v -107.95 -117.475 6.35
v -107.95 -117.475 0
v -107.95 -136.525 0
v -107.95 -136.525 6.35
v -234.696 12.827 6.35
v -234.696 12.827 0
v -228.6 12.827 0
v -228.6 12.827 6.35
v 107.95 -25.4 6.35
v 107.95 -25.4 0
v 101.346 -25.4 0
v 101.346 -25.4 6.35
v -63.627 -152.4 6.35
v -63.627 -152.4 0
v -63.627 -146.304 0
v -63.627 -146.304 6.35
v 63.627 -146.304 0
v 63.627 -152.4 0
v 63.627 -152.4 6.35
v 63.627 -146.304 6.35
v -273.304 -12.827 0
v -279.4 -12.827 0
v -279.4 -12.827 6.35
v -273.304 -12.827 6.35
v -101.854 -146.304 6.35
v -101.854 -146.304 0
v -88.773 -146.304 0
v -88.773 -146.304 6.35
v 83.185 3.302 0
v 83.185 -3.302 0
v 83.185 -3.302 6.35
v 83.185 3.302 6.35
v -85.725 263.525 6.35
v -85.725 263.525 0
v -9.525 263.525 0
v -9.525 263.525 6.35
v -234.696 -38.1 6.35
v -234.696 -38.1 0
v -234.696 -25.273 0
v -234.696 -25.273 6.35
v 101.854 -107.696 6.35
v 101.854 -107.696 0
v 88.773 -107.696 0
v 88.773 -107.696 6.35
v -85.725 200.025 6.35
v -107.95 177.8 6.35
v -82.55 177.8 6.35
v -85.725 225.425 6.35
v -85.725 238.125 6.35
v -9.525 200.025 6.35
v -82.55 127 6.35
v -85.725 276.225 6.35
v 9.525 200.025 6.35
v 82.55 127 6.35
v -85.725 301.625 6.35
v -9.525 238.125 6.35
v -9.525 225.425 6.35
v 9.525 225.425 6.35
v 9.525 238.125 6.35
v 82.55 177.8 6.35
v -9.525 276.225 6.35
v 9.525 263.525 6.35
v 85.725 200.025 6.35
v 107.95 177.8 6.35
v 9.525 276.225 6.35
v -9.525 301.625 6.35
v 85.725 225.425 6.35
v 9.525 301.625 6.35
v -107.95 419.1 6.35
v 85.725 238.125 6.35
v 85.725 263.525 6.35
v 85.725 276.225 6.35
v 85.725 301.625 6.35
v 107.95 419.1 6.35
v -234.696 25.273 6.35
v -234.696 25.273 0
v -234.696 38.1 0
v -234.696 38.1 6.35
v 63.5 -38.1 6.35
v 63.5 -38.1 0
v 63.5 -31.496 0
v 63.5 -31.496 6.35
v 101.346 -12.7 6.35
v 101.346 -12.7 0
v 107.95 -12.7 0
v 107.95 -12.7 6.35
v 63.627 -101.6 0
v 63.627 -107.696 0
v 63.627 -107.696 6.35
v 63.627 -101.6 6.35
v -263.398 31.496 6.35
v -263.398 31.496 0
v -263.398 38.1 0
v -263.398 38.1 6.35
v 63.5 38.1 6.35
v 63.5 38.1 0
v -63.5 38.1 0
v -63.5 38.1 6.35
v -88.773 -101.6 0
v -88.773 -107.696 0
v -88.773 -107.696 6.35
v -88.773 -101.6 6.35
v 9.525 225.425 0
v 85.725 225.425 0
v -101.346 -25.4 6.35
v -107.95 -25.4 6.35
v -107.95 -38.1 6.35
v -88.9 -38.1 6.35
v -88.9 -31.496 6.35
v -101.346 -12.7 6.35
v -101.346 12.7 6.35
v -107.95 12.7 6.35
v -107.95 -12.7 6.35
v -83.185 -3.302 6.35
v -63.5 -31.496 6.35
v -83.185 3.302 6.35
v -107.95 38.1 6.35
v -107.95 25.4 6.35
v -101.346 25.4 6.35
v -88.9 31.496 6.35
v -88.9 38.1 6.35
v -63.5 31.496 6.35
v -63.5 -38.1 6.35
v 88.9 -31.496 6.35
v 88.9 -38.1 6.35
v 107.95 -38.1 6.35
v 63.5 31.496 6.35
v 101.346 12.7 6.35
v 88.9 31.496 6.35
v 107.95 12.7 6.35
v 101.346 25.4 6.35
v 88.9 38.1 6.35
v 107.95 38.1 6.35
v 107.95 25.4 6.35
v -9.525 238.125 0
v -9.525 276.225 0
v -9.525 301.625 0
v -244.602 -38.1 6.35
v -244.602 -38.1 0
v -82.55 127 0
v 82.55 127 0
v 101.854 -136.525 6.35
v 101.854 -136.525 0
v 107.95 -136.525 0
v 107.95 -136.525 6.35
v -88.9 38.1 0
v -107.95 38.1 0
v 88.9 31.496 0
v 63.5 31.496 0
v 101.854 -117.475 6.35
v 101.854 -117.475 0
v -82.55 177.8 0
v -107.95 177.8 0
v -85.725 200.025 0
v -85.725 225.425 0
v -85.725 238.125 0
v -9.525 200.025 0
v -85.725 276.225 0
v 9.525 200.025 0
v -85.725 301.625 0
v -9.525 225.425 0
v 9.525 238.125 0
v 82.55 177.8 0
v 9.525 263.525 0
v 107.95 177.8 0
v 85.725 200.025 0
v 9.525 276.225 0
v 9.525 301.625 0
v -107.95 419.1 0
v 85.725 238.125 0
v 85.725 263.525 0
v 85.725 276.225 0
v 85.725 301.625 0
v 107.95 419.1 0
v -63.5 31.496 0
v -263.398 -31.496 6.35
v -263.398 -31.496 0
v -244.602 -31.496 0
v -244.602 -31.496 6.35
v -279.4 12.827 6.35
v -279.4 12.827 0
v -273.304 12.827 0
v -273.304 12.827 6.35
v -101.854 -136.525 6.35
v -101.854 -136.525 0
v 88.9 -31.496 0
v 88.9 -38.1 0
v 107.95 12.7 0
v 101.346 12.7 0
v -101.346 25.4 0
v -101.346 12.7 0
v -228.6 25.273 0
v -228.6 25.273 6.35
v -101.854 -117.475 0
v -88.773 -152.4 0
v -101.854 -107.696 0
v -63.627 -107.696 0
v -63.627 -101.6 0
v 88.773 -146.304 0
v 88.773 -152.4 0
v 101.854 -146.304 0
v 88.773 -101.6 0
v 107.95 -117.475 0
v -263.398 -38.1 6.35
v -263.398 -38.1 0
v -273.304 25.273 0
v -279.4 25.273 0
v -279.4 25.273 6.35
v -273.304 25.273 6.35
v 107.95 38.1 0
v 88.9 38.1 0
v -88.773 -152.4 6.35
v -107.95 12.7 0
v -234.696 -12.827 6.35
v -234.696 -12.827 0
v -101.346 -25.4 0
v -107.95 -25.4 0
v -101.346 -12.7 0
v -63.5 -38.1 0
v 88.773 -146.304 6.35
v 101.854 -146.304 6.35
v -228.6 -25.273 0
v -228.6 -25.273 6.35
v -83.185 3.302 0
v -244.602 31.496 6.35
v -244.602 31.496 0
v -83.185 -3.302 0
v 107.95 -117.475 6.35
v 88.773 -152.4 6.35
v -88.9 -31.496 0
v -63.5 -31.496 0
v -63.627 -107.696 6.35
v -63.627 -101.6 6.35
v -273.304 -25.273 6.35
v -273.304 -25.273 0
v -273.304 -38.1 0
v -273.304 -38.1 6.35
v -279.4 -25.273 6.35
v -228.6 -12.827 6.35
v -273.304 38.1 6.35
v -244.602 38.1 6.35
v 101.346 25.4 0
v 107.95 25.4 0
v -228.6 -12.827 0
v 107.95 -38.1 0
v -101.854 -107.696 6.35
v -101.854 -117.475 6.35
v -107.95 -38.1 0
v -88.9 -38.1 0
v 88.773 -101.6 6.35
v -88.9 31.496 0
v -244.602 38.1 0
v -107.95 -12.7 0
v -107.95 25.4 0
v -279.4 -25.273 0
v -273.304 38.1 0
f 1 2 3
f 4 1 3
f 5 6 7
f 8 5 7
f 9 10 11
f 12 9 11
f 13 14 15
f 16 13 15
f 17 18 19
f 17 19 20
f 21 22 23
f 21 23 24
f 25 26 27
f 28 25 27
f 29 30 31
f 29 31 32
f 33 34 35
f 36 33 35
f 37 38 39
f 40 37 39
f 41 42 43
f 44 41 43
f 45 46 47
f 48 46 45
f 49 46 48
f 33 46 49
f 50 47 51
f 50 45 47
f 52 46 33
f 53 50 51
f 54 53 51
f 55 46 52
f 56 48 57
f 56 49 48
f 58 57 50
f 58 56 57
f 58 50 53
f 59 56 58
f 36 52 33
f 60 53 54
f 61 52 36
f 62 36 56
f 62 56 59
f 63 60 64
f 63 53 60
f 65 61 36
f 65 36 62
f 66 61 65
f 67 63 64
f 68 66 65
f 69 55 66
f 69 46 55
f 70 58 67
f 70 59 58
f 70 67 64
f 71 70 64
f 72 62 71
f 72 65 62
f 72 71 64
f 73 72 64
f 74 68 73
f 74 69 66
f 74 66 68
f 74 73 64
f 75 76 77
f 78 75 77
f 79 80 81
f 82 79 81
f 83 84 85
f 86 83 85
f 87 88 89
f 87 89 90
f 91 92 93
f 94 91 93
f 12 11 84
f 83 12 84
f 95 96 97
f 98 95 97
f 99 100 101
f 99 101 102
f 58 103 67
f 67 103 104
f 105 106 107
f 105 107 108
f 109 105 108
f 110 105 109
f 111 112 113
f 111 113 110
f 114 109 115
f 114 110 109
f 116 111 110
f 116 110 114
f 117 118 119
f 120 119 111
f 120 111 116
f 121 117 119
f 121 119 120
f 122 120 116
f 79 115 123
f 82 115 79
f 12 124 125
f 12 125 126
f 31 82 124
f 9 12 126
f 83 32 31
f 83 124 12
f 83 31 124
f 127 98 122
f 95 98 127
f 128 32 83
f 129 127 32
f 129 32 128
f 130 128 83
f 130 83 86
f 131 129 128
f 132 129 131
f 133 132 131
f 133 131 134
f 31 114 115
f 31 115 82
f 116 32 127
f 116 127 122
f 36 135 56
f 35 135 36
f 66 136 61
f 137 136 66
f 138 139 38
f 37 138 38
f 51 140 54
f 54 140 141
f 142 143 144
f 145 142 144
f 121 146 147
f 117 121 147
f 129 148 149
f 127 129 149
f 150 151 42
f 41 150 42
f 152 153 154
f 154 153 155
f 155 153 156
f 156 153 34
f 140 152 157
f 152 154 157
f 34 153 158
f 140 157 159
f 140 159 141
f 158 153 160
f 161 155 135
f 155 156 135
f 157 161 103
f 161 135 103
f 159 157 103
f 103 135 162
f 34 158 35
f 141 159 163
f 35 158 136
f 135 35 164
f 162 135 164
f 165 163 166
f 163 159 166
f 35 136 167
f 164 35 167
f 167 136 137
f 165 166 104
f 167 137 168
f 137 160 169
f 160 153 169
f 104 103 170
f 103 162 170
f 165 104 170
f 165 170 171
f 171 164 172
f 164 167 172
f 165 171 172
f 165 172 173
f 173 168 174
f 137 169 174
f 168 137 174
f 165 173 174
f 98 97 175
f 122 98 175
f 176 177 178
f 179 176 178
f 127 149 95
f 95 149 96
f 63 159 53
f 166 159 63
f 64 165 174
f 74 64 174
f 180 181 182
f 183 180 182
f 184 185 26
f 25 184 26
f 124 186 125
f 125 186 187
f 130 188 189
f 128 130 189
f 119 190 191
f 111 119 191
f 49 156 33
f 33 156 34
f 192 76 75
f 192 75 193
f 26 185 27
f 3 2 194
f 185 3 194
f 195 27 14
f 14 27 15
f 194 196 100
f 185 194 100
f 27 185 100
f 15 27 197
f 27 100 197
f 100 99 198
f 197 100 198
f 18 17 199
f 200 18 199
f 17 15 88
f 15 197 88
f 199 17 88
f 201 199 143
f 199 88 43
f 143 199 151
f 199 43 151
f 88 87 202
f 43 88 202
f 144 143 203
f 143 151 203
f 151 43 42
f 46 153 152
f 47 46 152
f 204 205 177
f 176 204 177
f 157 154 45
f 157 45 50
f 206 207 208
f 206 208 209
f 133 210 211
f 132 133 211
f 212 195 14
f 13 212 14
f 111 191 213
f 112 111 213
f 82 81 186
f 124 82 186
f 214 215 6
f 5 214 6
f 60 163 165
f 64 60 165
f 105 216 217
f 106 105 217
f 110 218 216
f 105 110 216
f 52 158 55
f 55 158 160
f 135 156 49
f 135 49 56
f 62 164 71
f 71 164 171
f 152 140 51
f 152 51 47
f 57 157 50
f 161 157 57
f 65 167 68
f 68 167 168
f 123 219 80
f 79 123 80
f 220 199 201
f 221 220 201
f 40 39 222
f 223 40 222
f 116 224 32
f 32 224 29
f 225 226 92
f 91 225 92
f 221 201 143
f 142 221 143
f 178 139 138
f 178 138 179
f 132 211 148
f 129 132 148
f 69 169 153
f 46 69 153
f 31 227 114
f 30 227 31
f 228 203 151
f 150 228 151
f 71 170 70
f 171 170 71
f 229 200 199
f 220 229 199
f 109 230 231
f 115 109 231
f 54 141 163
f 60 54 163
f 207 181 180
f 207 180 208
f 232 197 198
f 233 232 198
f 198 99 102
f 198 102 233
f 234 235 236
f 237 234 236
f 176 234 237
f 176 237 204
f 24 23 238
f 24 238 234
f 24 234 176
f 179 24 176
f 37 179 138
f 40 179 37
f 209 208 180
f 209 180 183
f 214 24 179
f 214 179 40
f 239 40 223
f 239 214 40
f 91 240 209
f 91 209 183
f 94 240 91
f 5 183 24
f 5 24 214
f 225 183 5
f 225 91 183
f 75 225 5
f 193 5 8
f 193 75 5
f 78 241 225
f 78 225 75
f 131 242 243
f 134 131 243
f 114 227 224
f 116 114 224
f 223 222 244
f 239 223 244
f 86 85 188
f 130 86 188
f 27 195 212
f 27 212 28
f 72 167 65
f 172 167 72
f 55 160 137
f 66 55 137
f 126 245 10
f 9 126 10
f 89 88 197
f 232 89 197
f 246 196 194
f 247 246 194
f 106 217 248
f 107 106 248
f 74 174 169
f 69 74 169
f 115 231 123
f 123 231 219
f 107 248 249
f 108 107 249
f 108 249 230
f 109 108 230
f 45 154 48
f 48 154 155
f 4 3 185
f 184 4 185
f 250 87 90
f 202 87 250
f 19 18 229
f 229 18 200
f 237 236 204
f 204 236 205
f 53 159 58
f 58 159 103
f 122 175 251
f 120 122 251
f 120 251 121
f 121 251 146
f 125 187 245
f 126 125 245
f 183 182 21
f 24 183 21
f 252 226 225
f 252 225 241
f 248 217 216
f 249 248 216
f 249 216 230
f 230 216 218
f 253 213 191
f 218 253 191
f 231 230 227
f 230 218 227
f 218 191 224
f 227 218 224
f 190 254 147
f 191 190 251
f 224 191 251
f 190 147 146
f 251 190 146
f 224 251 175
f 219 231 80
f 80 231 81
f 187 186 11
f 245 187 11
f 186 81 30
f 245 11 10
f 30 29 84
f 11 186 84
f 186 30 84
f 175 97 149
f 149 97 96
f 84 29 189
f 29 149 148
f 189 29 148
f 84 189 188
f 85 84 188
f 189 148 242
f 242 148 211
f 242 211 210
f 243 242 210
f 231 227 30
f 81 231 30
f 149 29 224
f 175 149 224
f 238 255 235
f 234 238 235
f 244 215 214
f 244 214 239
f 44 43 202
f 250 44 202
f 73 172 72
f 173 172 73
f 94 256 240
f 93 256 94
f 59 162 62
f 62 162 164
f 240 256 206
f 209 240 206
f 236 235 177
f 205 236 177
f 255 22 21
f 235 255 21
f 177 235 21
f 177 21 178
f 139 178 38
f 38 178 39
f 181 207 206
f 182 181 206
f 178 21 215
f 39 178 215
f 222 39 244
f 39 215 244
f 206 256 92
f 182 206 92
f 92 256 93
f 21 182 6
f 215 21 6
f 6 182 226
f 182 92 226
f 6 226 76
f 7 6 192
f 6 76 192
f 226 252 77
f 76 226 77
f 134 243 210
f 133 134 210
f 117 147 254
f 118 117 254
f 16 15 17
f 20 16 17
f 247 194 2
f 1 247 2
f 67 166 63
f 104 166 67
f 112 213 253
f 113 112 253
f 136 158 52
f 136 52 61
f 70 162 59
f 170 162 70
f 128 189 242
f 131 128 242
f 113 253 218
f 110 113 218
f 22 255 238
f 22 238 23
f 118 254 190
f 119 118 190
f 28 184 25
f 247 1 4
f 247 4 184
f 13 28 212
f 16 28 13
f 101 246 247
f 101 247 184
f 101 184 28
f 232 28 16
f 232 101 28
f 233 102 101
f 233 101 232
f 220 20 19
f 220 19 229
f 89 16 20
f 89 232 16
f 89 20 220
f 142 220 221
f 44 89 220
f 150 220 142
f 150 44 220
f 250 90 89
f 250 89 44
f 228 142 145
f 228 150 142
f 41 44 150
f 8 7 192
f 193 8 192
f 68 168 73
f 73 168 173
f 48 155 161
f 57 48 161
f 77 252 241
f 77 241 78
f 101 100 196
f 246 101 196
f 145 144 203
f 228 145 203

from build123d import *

# Parameters (mm, degrees)
F0_W     = 166.37
F0_H     = 6.604
F1_DEPTH = 6.35
F0_W_2   = 25.146
F0_H_2   = 6.096
F2_DEPTH = 6.35
F0_W_3   = 6.096
F0_H_3   = 12.446
F0_W_4   = 9.906
F3_DEPTH = 6.35
F0_W_5   = 76.2
F0_H_4   = 25.4
F0_W_6   = 165.1
F0_H_5   = 50.8
F4_DEPTH = 6.35


with BuildPart() as f1:
    # F0 (on Top) → F1 (new body)
    with BuildSketch(Plane.XY):
        Polygon((-88.9, 38.1), (-107.95, 38.1), (-107.95, 25.4), (-101.346, 25.4), (-101.346, 12.7), (-107.95, 12.7), (-107.95, -12.7), (-101.346, -12.7), (-101.346, -25.4), (-107.95, -25.4), (-107.95, -38.1), (-88.9, -38.1), (-88.9, -31.496), (-63.5, -31.496), (-63.5, -38.1), (63.5, -38.1), (63.5, -31.496), (88.9, -31.496), (88.9, -38.1), (107.95, -38.1), (107.95, -25.4), (101.346, -25.4), (101.346, -12.7), (107.95, -12.7), (107.95, 12.7), (101.346, 12.7), (101.346, 25.4), (107.95, 25.4), (107.95, 38.1), (88.9, 38.1), (88.9, 31.496), (63.5, 31.496), (63.5, 38.1), (-63.5, 38.1), (-63.5, 31.496), (-88.9, 31.496), align=None)
        Rectangle(F0_W, F0_H, mode=Mode.SUBTRACT)
    extrude(amount=F1_DEPTH)


with BuildPart() as f2:
    # F0 (on Top) → F2 (new body)
    with BuildSketch(Plane.XY):
        with Locations((-76.2, -104.648)):
            Rectangle(F0_W_2, F0_H_2)
        with Locations((-76.2, -149.352)):
            Rectangle(F0_W_2, F0_H_2)
        with Locations((76.2, -149.352)):
            Rectangle(F0_W_2, F0_H_2)
        with Locations((76.2, -104.648)):
            Rectangle(F0_W_2, F0_H_2)
        Polygon((-88.773, -107.696), (-101.854, -107.696), (-101.854, -117.475), (-107.95, -117.475), (-107.95, -136.525), (-101.854, -136.525), (-101.854, -146.304), (-88.773, -146.304), (-63.627, -146.304), (63.627, -146.304), (88.773, -146.304), (101.854, -146.304), (101.854, -136.525), (107.95, -136.525), (107.95, -117.475), (101.854, -117.475), (101.854, -107.696), (88.773, -107.696), (63.627, -107.696), (-63.627, -107.696), align=None)
    extrude(amount=F2_DEPTH)


with BuildPart() as f3:
    # F0 (on Top) → F3 (new body)
    with BuildSketch(Plane.XY):
        with Locations((-231.648, 19.05)):
            Rectangle(F0_W_3, F0_H_3)
        with Locations((-231.648, -19.05)):
            Rectangle(F0_W_3, F0_H_3)
        with Locations((-276.352, -19.05)):
            Rectangle(F0_W_3, F0_H_3)
        with Locations((-276.352, 19.05)):
            Rectangle(F0_W_3, F0_H_3)
        Polygon((-263.398, 31.496), (-273.304, 31.496), (-273.304, 25.273), (-273.304, 12.827), (-273.304, -12.827), (-273.304, -25.273), (-273.304, -31.496), (-263.398, -31.496), (-244.602, -31.496), (-234.696, -31.496), (-234.696, -25.273), (-234.696, -12.827), (-234.696, 12.827), (-234.696, 25.273), (-234.696, 31.496), (-244.602, 31.496), align=None)
        with Locations((-239.649, 34.798)):
            Rectangle(F0_W_4, F0_H)
        with Locations((-268.351, 34.798)):
            Rectangle(F0_W_4, F0_H)
        with Locations((-268.351, -34.798)):
            Rectangle(F0_W_4, F0_H)
        with Locations((-239.649, -34.798)):
            Rectangle(F0_W_4, F0_H)
    extrude(amount=F3_DEPTH)


with BuildPart() as f4:
    # F0 (on Top) → F4 (new body)
    with BuildSketch(Plane.XY):
        Polygon((107.95, 419.1), (-107.95, 419.1), (-107.95, 177.8), (-82.55, 177.8), (82.55, 177.8), (107.95, 177.8), align=None)
        with Locations((-47.625, 212.725)):
            Rectangle(F0_W_5, F0_H_4, mode=Mode.SUBTRACT)
        with Locations((-47.625, 250.825)):
            Rectangle(F0_W_5, F0_H_4, mode=Mode.SUBTRACT)
        with Locations((47.625, 212.725)):
            Rectangle(F0_W_5, F0_H_4, mode=Mode.SUBTRACT)
        with Locations((47.625, 250.825)):
            Rectangle(F0_W_5, F0_H_4, mode=Mode.SUBTRACT)
        with Locations((-47.625, 288.925)):
            Rectangle(F0_W_5, F0_H_4, mode=Mode.SUBTRACT)
        with Locations((47.625, 288.925)):
            Rectangle(F0_W_5, F0_H_4, mode=Mode.SUBTRACT)
        with Locations((0, 152.4)):
            Rectangle(F0_W_6, F0_H_5)
    extrude(amount=F4_DEPTH)


solid = Compound([f1.part, f2.part, f3.part, f4.part])
